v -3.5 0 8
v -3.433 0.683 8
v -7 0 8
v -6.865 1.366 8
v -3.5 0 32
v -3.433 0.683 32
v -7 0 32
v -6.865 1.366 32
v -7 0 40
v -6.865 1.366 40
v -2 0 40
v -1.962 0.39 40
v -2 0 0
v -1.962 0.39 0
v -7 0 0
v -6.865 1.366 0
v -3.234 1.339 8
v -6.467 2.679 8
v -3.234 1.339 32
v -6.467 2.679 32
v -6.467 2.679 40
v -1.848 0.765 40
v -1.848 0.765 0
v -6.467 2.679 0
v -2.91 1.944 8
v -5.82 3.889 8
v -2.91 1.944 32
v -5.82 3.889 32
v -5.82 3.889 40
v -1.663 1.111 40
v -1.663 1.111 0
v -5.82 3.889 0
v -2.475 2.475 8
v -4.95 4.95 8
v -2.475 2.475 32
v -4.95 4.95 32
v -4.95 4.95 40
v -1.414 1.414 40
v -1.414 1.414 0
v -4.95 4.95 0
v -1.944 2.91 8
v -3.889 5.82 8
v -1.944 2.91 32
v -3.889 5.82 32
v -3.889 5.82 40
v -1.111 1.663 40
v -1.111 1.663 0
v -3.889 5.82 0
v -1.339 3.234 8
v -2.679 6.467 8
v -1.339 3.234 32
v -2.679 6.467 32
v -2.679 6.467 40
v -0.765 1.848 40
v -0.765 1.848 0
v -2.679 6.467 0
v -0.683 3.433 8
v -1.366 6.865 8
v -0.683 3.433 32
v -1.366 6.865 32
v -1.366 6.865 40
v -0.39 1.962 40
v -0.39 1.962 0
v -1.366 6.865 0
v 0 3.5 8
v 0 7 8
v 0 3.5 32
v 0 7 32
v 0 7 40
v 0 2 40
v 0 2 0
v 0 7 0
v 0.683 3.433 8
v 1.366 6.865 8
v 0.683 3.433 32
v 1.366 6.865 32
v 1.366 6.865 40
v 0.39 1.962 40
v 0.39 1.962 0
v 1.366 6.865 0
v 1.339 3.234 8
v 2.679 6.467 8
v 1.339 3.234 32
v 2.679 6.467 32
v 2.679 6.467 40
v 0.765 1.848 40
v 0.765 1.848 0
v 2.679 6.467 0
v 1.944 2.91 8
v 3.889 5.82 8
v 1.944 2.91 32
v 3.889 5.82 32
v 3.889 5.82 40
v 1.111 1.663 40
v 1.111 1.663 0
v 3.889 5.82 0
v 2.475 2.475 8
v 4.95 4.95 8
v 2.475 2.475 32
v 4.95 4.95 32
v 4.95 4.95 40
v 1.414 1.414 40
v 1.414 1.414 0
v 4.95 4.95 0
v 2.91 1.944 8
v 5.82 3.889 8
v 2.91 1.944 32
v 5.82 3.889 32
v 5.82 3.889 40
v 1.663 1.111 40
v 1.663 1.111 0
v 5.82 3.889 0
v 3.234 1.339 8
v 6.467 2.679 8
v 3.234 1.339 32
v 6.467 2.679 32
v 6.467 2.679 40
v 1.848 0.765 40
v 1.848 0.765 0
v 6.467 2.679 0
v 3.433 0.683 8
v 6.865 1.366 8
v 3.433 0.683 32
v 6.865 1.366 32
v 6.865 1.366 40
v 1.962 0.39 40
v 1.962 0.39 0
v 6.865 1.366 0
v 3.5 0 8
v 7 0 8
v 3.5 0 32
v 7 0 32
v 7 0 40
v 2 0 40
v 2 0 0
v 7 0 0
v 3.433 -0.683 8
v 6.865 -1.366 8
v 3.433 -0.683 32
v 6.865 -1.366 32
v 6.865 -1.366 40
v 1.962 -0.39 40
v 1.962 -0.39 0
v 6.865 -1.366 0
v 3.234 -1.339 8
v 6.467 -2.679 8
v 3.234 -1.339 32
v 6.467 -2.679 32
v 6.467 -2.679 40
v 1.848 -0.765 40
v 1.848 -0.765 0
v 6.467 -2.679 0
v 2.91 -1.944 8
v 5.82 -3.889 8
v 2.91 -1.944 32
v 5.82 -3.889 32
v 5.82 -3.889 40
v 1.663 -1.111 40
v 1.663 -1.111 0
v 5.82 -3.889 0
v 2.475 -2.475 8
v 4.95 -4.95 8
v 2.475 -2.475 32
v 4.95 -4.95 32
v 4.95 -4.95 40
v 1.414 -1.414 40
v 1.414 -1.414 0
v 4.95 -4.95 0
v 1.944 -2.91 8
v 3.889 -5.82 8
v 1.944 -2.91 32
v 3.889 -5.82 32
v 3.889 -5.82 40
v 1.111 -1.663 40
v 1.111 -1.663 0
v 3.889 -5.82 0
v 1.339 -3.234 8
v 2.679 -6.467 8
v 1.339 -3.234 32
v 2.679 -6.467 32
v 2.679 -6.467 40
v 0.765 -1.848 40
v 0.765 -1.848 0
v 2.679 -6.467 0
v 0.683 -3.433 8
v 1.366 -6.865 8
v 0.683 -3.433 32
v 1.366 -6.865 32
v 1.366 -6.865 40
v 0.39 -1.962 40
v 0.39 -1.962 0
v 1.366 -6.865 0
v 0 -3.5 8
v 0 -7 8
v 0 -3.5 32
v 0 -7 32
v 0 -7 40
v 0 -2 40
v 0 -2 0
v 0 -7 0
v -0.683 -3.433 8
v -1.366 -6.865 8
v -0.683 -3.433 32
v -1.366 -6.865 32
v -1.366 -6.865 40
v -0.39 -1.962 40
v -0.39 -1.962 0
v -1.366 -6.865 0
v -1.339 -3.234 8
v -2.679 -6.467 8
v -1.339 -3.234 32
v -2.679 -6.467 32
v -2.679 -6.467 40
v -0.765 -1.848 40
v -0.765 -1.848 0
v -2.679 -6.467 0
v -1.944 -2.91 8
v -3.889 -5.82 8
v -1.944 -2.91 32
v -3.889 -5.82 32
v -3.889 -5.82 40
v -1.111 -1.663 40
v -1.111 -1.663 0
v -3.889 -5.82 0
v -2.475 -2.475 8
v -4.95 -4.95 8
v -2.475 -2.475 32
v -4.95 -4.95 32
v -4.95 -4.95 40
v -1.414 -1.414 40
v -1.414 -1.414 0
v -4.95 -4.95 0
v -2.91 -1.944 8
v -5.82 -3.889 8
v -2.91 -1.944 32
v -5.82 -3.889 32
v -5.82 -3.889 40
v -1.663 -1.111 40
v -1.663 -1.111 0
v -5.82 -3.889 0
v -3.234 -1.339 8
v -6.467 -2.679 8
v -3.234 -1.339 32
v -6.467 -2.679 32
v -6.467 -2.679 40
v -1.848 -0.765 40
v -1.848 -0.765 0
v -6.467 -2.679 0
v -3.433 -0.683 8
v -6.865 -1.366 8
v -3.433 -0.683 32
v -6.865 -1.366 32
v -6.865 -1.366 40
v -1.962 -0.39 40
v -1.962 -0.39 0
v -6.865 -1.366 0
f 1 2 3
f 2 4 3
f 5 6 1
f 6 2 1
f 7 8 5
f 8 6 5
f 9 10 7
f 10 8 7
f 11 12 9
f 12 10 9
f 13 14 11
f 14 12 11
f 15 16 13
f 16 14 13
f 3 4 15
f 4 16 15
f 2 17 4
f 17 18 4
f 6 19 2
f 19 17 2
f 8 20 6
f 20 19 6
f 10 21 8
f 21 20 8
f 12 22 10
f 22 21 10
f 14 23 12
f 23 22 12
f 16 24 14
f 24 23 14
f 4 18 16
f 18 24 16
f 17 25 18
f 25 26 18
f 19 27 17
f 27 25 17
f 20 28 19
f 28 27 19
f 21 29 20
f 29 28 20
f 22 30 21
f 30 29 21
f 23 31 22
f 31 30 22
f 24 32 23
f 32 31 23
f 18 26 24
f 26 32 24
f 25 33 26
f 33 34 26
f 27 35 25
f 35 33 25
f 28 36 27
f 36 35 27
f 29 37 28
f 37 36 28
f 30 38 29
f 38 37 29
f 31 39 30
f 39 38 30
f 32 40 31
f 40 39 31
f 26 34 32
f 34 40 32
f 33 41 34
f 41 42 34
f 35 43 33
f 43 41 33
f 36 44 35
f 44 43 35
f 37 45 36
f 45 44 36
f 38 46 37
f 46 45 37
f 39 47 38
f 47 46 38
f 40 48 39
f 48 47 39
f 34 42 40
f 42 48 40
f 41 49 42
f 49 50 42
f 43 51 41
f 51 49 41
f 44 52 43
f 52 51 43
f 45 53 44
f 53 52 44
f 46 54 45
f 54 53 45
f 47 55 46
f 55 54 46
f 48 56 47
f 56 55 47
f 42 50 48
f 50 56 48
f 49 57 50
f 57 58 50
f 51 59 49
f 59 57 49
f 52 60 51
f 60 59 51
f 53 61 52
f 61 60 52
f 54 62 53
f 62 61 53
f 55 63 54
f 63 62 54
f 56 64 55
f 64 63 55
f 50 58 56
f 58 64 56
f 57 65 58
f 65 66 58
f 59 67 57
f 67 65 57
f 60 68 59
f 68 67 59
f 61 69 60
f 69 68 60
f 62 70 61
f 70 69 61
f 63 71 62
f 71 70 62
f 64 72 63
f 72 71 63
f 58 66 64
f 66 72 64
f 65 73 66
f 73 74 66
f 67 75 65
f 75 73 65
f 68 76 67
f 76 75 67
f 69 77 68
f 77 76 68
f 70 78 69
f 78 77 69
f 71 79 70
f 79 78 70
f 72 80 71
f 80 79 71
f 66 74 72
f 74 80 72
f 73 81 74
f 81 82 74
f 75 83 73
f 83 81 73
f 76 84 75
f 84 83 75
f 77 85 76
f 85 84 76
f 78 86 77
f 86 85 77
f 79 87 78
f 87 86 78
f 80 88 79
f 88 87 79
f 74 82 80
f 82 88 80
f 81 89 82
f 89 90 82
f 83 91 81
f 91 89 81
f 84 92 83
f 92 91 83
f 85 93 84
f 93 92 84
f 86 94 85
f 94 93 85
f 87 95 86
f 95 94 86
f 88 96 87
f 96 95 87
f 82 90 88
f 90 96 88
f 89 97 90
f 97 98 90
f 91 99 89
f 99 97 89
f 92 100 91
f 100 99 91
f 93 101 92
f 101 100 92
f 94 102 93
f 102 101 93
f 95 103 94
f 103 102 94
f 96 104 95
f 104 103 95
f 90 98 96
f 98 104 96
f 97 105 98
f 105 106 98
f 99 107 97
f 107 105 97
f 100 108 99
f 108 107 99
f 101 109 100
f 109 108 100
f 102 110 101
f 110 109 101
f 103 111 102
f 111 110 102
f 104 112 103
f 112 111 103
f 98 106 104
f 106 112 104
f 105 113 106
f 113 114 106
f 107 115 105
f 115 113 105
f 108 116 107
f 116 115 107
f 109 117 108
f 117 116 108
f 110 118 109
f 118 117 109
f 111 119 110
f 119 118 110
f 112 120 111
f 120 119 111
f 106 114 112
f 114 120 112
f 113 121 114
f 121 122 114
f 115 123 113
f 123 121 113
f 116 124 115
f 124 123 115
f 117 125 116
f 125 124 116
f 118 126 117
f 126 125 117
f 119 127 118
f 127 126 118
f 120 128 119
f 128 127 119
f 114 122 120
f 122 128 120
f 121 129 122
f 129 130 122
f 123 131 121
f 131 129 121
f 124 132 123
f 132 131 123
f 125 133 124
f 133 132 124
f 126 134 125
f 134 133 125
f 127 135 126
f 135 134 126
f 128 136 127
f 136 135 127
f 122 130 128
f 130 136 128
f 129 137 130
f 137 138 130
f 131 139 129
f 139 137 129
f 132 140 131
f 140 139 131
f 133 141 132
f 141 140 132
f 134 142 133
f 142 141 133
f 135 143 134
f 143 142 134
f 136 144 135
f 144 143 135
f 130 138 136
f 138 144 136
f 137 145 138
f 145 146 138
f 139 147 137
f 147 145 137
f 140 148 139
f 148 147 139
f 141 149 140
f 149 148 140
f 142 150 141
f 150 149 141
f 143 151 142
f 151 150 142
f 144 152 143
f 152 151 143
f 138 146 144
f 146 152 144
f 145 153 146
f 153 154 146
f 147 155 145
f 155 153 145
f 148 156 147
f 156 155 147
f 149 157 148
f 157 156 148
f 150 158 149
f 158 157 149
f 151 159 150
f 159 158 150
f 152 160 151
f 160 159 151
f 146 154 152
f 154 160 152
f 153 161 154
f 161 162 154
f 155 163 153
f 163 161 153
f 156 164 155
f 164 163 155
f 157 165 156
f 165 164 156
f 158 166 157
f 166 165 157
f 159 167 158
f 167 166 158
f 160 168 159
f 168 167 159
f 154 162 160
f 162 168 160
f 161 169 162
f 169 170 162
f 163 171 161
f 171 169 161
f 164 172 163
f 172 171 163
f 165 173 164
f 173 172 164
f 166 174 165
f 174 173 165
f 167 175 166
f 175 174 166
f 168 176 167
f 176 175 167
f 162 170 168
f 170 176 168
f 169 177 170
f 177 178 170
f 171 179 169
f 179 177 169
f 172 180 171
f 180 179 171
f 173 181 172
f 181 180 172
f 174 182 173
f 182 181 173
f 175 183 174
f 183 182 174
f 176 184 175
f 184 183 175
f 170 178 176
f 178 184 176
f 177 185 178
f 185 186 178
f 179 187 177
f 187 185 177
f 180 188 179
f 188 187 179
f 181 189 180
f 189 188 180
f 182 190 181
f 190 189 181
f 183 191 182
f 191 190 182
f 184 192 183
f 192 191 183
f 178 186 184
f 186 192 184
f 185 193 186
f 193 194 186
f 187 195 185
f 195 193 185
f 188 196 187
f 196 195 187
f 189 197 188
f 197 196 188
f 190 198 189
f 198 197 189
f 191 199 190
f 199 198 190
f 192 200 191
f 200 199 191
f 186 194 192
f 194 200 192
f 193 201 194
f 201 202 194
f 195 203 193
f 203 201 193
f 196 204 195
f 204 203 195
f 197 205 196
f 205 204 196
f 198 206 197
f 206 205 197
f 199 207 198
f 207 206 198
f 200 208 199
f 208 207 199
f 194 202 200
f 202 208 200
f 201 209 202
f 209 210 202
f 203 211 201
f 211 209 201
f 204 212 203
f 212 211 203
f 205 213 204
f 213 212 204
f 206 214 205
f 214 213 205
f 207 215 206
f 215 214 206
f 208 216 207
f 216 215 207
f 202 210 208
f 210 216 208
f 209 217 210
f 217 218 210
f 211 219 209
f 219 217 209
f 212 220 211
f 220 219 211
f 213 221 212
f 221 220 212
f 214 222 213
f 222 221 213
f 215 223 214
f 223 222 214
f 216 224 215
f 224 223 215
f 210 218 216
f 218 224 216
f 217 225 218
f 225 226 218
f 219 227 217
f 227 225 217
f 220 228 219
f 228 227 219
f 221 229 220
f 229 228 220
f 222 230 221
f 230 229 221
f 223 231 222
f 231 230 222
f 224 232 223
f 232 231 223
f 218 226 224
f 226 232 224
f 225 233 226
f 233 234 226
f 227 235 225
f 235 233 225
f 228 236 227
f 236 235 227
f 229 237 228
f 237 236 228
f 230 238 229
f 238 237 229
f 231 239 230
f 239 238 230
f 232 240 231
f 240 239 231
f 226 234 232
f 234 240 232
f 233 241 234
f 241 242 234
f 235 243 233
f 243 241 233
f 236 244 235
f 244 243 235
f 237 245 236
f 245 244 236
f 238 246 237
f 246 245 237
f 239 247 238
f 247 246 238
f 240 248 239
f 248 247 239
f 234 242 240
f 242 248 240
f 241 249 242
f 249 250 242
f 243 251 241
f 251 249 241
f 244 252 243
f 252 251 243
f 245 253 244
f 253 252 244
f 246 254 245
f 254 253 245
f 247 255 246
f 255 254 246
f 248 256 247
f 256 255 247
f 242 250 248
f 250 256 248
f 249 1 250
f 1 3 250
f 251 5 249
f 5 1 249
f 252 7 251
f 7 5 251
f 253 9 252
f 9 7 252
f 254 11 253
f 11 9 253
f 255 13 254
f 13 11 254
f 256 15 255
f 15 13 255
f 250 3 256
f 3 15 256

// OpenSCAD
$fn = 32;

// ----------------------------------------------------------------------
// Profiled standoff: spool spacer, 40 mm long, bore 4 mm
// ----------------------------------------------------------------------

// --- parameters (mm) ---
revolve_angle = 360;      // full turn around the Z axis
profile_points = 8;       // points of the closed outline

profile = [[2, 0], [7, 0], [7, 8], [3.5, 8], [3.5, 32], [7, 32], [7, 40], [2, 40]];  // single closed polygon, 8 points, counter clockwise

// --- the one profile operation ---
rotate_extrude(angle = revolve_angle) polygon(points = profile);
